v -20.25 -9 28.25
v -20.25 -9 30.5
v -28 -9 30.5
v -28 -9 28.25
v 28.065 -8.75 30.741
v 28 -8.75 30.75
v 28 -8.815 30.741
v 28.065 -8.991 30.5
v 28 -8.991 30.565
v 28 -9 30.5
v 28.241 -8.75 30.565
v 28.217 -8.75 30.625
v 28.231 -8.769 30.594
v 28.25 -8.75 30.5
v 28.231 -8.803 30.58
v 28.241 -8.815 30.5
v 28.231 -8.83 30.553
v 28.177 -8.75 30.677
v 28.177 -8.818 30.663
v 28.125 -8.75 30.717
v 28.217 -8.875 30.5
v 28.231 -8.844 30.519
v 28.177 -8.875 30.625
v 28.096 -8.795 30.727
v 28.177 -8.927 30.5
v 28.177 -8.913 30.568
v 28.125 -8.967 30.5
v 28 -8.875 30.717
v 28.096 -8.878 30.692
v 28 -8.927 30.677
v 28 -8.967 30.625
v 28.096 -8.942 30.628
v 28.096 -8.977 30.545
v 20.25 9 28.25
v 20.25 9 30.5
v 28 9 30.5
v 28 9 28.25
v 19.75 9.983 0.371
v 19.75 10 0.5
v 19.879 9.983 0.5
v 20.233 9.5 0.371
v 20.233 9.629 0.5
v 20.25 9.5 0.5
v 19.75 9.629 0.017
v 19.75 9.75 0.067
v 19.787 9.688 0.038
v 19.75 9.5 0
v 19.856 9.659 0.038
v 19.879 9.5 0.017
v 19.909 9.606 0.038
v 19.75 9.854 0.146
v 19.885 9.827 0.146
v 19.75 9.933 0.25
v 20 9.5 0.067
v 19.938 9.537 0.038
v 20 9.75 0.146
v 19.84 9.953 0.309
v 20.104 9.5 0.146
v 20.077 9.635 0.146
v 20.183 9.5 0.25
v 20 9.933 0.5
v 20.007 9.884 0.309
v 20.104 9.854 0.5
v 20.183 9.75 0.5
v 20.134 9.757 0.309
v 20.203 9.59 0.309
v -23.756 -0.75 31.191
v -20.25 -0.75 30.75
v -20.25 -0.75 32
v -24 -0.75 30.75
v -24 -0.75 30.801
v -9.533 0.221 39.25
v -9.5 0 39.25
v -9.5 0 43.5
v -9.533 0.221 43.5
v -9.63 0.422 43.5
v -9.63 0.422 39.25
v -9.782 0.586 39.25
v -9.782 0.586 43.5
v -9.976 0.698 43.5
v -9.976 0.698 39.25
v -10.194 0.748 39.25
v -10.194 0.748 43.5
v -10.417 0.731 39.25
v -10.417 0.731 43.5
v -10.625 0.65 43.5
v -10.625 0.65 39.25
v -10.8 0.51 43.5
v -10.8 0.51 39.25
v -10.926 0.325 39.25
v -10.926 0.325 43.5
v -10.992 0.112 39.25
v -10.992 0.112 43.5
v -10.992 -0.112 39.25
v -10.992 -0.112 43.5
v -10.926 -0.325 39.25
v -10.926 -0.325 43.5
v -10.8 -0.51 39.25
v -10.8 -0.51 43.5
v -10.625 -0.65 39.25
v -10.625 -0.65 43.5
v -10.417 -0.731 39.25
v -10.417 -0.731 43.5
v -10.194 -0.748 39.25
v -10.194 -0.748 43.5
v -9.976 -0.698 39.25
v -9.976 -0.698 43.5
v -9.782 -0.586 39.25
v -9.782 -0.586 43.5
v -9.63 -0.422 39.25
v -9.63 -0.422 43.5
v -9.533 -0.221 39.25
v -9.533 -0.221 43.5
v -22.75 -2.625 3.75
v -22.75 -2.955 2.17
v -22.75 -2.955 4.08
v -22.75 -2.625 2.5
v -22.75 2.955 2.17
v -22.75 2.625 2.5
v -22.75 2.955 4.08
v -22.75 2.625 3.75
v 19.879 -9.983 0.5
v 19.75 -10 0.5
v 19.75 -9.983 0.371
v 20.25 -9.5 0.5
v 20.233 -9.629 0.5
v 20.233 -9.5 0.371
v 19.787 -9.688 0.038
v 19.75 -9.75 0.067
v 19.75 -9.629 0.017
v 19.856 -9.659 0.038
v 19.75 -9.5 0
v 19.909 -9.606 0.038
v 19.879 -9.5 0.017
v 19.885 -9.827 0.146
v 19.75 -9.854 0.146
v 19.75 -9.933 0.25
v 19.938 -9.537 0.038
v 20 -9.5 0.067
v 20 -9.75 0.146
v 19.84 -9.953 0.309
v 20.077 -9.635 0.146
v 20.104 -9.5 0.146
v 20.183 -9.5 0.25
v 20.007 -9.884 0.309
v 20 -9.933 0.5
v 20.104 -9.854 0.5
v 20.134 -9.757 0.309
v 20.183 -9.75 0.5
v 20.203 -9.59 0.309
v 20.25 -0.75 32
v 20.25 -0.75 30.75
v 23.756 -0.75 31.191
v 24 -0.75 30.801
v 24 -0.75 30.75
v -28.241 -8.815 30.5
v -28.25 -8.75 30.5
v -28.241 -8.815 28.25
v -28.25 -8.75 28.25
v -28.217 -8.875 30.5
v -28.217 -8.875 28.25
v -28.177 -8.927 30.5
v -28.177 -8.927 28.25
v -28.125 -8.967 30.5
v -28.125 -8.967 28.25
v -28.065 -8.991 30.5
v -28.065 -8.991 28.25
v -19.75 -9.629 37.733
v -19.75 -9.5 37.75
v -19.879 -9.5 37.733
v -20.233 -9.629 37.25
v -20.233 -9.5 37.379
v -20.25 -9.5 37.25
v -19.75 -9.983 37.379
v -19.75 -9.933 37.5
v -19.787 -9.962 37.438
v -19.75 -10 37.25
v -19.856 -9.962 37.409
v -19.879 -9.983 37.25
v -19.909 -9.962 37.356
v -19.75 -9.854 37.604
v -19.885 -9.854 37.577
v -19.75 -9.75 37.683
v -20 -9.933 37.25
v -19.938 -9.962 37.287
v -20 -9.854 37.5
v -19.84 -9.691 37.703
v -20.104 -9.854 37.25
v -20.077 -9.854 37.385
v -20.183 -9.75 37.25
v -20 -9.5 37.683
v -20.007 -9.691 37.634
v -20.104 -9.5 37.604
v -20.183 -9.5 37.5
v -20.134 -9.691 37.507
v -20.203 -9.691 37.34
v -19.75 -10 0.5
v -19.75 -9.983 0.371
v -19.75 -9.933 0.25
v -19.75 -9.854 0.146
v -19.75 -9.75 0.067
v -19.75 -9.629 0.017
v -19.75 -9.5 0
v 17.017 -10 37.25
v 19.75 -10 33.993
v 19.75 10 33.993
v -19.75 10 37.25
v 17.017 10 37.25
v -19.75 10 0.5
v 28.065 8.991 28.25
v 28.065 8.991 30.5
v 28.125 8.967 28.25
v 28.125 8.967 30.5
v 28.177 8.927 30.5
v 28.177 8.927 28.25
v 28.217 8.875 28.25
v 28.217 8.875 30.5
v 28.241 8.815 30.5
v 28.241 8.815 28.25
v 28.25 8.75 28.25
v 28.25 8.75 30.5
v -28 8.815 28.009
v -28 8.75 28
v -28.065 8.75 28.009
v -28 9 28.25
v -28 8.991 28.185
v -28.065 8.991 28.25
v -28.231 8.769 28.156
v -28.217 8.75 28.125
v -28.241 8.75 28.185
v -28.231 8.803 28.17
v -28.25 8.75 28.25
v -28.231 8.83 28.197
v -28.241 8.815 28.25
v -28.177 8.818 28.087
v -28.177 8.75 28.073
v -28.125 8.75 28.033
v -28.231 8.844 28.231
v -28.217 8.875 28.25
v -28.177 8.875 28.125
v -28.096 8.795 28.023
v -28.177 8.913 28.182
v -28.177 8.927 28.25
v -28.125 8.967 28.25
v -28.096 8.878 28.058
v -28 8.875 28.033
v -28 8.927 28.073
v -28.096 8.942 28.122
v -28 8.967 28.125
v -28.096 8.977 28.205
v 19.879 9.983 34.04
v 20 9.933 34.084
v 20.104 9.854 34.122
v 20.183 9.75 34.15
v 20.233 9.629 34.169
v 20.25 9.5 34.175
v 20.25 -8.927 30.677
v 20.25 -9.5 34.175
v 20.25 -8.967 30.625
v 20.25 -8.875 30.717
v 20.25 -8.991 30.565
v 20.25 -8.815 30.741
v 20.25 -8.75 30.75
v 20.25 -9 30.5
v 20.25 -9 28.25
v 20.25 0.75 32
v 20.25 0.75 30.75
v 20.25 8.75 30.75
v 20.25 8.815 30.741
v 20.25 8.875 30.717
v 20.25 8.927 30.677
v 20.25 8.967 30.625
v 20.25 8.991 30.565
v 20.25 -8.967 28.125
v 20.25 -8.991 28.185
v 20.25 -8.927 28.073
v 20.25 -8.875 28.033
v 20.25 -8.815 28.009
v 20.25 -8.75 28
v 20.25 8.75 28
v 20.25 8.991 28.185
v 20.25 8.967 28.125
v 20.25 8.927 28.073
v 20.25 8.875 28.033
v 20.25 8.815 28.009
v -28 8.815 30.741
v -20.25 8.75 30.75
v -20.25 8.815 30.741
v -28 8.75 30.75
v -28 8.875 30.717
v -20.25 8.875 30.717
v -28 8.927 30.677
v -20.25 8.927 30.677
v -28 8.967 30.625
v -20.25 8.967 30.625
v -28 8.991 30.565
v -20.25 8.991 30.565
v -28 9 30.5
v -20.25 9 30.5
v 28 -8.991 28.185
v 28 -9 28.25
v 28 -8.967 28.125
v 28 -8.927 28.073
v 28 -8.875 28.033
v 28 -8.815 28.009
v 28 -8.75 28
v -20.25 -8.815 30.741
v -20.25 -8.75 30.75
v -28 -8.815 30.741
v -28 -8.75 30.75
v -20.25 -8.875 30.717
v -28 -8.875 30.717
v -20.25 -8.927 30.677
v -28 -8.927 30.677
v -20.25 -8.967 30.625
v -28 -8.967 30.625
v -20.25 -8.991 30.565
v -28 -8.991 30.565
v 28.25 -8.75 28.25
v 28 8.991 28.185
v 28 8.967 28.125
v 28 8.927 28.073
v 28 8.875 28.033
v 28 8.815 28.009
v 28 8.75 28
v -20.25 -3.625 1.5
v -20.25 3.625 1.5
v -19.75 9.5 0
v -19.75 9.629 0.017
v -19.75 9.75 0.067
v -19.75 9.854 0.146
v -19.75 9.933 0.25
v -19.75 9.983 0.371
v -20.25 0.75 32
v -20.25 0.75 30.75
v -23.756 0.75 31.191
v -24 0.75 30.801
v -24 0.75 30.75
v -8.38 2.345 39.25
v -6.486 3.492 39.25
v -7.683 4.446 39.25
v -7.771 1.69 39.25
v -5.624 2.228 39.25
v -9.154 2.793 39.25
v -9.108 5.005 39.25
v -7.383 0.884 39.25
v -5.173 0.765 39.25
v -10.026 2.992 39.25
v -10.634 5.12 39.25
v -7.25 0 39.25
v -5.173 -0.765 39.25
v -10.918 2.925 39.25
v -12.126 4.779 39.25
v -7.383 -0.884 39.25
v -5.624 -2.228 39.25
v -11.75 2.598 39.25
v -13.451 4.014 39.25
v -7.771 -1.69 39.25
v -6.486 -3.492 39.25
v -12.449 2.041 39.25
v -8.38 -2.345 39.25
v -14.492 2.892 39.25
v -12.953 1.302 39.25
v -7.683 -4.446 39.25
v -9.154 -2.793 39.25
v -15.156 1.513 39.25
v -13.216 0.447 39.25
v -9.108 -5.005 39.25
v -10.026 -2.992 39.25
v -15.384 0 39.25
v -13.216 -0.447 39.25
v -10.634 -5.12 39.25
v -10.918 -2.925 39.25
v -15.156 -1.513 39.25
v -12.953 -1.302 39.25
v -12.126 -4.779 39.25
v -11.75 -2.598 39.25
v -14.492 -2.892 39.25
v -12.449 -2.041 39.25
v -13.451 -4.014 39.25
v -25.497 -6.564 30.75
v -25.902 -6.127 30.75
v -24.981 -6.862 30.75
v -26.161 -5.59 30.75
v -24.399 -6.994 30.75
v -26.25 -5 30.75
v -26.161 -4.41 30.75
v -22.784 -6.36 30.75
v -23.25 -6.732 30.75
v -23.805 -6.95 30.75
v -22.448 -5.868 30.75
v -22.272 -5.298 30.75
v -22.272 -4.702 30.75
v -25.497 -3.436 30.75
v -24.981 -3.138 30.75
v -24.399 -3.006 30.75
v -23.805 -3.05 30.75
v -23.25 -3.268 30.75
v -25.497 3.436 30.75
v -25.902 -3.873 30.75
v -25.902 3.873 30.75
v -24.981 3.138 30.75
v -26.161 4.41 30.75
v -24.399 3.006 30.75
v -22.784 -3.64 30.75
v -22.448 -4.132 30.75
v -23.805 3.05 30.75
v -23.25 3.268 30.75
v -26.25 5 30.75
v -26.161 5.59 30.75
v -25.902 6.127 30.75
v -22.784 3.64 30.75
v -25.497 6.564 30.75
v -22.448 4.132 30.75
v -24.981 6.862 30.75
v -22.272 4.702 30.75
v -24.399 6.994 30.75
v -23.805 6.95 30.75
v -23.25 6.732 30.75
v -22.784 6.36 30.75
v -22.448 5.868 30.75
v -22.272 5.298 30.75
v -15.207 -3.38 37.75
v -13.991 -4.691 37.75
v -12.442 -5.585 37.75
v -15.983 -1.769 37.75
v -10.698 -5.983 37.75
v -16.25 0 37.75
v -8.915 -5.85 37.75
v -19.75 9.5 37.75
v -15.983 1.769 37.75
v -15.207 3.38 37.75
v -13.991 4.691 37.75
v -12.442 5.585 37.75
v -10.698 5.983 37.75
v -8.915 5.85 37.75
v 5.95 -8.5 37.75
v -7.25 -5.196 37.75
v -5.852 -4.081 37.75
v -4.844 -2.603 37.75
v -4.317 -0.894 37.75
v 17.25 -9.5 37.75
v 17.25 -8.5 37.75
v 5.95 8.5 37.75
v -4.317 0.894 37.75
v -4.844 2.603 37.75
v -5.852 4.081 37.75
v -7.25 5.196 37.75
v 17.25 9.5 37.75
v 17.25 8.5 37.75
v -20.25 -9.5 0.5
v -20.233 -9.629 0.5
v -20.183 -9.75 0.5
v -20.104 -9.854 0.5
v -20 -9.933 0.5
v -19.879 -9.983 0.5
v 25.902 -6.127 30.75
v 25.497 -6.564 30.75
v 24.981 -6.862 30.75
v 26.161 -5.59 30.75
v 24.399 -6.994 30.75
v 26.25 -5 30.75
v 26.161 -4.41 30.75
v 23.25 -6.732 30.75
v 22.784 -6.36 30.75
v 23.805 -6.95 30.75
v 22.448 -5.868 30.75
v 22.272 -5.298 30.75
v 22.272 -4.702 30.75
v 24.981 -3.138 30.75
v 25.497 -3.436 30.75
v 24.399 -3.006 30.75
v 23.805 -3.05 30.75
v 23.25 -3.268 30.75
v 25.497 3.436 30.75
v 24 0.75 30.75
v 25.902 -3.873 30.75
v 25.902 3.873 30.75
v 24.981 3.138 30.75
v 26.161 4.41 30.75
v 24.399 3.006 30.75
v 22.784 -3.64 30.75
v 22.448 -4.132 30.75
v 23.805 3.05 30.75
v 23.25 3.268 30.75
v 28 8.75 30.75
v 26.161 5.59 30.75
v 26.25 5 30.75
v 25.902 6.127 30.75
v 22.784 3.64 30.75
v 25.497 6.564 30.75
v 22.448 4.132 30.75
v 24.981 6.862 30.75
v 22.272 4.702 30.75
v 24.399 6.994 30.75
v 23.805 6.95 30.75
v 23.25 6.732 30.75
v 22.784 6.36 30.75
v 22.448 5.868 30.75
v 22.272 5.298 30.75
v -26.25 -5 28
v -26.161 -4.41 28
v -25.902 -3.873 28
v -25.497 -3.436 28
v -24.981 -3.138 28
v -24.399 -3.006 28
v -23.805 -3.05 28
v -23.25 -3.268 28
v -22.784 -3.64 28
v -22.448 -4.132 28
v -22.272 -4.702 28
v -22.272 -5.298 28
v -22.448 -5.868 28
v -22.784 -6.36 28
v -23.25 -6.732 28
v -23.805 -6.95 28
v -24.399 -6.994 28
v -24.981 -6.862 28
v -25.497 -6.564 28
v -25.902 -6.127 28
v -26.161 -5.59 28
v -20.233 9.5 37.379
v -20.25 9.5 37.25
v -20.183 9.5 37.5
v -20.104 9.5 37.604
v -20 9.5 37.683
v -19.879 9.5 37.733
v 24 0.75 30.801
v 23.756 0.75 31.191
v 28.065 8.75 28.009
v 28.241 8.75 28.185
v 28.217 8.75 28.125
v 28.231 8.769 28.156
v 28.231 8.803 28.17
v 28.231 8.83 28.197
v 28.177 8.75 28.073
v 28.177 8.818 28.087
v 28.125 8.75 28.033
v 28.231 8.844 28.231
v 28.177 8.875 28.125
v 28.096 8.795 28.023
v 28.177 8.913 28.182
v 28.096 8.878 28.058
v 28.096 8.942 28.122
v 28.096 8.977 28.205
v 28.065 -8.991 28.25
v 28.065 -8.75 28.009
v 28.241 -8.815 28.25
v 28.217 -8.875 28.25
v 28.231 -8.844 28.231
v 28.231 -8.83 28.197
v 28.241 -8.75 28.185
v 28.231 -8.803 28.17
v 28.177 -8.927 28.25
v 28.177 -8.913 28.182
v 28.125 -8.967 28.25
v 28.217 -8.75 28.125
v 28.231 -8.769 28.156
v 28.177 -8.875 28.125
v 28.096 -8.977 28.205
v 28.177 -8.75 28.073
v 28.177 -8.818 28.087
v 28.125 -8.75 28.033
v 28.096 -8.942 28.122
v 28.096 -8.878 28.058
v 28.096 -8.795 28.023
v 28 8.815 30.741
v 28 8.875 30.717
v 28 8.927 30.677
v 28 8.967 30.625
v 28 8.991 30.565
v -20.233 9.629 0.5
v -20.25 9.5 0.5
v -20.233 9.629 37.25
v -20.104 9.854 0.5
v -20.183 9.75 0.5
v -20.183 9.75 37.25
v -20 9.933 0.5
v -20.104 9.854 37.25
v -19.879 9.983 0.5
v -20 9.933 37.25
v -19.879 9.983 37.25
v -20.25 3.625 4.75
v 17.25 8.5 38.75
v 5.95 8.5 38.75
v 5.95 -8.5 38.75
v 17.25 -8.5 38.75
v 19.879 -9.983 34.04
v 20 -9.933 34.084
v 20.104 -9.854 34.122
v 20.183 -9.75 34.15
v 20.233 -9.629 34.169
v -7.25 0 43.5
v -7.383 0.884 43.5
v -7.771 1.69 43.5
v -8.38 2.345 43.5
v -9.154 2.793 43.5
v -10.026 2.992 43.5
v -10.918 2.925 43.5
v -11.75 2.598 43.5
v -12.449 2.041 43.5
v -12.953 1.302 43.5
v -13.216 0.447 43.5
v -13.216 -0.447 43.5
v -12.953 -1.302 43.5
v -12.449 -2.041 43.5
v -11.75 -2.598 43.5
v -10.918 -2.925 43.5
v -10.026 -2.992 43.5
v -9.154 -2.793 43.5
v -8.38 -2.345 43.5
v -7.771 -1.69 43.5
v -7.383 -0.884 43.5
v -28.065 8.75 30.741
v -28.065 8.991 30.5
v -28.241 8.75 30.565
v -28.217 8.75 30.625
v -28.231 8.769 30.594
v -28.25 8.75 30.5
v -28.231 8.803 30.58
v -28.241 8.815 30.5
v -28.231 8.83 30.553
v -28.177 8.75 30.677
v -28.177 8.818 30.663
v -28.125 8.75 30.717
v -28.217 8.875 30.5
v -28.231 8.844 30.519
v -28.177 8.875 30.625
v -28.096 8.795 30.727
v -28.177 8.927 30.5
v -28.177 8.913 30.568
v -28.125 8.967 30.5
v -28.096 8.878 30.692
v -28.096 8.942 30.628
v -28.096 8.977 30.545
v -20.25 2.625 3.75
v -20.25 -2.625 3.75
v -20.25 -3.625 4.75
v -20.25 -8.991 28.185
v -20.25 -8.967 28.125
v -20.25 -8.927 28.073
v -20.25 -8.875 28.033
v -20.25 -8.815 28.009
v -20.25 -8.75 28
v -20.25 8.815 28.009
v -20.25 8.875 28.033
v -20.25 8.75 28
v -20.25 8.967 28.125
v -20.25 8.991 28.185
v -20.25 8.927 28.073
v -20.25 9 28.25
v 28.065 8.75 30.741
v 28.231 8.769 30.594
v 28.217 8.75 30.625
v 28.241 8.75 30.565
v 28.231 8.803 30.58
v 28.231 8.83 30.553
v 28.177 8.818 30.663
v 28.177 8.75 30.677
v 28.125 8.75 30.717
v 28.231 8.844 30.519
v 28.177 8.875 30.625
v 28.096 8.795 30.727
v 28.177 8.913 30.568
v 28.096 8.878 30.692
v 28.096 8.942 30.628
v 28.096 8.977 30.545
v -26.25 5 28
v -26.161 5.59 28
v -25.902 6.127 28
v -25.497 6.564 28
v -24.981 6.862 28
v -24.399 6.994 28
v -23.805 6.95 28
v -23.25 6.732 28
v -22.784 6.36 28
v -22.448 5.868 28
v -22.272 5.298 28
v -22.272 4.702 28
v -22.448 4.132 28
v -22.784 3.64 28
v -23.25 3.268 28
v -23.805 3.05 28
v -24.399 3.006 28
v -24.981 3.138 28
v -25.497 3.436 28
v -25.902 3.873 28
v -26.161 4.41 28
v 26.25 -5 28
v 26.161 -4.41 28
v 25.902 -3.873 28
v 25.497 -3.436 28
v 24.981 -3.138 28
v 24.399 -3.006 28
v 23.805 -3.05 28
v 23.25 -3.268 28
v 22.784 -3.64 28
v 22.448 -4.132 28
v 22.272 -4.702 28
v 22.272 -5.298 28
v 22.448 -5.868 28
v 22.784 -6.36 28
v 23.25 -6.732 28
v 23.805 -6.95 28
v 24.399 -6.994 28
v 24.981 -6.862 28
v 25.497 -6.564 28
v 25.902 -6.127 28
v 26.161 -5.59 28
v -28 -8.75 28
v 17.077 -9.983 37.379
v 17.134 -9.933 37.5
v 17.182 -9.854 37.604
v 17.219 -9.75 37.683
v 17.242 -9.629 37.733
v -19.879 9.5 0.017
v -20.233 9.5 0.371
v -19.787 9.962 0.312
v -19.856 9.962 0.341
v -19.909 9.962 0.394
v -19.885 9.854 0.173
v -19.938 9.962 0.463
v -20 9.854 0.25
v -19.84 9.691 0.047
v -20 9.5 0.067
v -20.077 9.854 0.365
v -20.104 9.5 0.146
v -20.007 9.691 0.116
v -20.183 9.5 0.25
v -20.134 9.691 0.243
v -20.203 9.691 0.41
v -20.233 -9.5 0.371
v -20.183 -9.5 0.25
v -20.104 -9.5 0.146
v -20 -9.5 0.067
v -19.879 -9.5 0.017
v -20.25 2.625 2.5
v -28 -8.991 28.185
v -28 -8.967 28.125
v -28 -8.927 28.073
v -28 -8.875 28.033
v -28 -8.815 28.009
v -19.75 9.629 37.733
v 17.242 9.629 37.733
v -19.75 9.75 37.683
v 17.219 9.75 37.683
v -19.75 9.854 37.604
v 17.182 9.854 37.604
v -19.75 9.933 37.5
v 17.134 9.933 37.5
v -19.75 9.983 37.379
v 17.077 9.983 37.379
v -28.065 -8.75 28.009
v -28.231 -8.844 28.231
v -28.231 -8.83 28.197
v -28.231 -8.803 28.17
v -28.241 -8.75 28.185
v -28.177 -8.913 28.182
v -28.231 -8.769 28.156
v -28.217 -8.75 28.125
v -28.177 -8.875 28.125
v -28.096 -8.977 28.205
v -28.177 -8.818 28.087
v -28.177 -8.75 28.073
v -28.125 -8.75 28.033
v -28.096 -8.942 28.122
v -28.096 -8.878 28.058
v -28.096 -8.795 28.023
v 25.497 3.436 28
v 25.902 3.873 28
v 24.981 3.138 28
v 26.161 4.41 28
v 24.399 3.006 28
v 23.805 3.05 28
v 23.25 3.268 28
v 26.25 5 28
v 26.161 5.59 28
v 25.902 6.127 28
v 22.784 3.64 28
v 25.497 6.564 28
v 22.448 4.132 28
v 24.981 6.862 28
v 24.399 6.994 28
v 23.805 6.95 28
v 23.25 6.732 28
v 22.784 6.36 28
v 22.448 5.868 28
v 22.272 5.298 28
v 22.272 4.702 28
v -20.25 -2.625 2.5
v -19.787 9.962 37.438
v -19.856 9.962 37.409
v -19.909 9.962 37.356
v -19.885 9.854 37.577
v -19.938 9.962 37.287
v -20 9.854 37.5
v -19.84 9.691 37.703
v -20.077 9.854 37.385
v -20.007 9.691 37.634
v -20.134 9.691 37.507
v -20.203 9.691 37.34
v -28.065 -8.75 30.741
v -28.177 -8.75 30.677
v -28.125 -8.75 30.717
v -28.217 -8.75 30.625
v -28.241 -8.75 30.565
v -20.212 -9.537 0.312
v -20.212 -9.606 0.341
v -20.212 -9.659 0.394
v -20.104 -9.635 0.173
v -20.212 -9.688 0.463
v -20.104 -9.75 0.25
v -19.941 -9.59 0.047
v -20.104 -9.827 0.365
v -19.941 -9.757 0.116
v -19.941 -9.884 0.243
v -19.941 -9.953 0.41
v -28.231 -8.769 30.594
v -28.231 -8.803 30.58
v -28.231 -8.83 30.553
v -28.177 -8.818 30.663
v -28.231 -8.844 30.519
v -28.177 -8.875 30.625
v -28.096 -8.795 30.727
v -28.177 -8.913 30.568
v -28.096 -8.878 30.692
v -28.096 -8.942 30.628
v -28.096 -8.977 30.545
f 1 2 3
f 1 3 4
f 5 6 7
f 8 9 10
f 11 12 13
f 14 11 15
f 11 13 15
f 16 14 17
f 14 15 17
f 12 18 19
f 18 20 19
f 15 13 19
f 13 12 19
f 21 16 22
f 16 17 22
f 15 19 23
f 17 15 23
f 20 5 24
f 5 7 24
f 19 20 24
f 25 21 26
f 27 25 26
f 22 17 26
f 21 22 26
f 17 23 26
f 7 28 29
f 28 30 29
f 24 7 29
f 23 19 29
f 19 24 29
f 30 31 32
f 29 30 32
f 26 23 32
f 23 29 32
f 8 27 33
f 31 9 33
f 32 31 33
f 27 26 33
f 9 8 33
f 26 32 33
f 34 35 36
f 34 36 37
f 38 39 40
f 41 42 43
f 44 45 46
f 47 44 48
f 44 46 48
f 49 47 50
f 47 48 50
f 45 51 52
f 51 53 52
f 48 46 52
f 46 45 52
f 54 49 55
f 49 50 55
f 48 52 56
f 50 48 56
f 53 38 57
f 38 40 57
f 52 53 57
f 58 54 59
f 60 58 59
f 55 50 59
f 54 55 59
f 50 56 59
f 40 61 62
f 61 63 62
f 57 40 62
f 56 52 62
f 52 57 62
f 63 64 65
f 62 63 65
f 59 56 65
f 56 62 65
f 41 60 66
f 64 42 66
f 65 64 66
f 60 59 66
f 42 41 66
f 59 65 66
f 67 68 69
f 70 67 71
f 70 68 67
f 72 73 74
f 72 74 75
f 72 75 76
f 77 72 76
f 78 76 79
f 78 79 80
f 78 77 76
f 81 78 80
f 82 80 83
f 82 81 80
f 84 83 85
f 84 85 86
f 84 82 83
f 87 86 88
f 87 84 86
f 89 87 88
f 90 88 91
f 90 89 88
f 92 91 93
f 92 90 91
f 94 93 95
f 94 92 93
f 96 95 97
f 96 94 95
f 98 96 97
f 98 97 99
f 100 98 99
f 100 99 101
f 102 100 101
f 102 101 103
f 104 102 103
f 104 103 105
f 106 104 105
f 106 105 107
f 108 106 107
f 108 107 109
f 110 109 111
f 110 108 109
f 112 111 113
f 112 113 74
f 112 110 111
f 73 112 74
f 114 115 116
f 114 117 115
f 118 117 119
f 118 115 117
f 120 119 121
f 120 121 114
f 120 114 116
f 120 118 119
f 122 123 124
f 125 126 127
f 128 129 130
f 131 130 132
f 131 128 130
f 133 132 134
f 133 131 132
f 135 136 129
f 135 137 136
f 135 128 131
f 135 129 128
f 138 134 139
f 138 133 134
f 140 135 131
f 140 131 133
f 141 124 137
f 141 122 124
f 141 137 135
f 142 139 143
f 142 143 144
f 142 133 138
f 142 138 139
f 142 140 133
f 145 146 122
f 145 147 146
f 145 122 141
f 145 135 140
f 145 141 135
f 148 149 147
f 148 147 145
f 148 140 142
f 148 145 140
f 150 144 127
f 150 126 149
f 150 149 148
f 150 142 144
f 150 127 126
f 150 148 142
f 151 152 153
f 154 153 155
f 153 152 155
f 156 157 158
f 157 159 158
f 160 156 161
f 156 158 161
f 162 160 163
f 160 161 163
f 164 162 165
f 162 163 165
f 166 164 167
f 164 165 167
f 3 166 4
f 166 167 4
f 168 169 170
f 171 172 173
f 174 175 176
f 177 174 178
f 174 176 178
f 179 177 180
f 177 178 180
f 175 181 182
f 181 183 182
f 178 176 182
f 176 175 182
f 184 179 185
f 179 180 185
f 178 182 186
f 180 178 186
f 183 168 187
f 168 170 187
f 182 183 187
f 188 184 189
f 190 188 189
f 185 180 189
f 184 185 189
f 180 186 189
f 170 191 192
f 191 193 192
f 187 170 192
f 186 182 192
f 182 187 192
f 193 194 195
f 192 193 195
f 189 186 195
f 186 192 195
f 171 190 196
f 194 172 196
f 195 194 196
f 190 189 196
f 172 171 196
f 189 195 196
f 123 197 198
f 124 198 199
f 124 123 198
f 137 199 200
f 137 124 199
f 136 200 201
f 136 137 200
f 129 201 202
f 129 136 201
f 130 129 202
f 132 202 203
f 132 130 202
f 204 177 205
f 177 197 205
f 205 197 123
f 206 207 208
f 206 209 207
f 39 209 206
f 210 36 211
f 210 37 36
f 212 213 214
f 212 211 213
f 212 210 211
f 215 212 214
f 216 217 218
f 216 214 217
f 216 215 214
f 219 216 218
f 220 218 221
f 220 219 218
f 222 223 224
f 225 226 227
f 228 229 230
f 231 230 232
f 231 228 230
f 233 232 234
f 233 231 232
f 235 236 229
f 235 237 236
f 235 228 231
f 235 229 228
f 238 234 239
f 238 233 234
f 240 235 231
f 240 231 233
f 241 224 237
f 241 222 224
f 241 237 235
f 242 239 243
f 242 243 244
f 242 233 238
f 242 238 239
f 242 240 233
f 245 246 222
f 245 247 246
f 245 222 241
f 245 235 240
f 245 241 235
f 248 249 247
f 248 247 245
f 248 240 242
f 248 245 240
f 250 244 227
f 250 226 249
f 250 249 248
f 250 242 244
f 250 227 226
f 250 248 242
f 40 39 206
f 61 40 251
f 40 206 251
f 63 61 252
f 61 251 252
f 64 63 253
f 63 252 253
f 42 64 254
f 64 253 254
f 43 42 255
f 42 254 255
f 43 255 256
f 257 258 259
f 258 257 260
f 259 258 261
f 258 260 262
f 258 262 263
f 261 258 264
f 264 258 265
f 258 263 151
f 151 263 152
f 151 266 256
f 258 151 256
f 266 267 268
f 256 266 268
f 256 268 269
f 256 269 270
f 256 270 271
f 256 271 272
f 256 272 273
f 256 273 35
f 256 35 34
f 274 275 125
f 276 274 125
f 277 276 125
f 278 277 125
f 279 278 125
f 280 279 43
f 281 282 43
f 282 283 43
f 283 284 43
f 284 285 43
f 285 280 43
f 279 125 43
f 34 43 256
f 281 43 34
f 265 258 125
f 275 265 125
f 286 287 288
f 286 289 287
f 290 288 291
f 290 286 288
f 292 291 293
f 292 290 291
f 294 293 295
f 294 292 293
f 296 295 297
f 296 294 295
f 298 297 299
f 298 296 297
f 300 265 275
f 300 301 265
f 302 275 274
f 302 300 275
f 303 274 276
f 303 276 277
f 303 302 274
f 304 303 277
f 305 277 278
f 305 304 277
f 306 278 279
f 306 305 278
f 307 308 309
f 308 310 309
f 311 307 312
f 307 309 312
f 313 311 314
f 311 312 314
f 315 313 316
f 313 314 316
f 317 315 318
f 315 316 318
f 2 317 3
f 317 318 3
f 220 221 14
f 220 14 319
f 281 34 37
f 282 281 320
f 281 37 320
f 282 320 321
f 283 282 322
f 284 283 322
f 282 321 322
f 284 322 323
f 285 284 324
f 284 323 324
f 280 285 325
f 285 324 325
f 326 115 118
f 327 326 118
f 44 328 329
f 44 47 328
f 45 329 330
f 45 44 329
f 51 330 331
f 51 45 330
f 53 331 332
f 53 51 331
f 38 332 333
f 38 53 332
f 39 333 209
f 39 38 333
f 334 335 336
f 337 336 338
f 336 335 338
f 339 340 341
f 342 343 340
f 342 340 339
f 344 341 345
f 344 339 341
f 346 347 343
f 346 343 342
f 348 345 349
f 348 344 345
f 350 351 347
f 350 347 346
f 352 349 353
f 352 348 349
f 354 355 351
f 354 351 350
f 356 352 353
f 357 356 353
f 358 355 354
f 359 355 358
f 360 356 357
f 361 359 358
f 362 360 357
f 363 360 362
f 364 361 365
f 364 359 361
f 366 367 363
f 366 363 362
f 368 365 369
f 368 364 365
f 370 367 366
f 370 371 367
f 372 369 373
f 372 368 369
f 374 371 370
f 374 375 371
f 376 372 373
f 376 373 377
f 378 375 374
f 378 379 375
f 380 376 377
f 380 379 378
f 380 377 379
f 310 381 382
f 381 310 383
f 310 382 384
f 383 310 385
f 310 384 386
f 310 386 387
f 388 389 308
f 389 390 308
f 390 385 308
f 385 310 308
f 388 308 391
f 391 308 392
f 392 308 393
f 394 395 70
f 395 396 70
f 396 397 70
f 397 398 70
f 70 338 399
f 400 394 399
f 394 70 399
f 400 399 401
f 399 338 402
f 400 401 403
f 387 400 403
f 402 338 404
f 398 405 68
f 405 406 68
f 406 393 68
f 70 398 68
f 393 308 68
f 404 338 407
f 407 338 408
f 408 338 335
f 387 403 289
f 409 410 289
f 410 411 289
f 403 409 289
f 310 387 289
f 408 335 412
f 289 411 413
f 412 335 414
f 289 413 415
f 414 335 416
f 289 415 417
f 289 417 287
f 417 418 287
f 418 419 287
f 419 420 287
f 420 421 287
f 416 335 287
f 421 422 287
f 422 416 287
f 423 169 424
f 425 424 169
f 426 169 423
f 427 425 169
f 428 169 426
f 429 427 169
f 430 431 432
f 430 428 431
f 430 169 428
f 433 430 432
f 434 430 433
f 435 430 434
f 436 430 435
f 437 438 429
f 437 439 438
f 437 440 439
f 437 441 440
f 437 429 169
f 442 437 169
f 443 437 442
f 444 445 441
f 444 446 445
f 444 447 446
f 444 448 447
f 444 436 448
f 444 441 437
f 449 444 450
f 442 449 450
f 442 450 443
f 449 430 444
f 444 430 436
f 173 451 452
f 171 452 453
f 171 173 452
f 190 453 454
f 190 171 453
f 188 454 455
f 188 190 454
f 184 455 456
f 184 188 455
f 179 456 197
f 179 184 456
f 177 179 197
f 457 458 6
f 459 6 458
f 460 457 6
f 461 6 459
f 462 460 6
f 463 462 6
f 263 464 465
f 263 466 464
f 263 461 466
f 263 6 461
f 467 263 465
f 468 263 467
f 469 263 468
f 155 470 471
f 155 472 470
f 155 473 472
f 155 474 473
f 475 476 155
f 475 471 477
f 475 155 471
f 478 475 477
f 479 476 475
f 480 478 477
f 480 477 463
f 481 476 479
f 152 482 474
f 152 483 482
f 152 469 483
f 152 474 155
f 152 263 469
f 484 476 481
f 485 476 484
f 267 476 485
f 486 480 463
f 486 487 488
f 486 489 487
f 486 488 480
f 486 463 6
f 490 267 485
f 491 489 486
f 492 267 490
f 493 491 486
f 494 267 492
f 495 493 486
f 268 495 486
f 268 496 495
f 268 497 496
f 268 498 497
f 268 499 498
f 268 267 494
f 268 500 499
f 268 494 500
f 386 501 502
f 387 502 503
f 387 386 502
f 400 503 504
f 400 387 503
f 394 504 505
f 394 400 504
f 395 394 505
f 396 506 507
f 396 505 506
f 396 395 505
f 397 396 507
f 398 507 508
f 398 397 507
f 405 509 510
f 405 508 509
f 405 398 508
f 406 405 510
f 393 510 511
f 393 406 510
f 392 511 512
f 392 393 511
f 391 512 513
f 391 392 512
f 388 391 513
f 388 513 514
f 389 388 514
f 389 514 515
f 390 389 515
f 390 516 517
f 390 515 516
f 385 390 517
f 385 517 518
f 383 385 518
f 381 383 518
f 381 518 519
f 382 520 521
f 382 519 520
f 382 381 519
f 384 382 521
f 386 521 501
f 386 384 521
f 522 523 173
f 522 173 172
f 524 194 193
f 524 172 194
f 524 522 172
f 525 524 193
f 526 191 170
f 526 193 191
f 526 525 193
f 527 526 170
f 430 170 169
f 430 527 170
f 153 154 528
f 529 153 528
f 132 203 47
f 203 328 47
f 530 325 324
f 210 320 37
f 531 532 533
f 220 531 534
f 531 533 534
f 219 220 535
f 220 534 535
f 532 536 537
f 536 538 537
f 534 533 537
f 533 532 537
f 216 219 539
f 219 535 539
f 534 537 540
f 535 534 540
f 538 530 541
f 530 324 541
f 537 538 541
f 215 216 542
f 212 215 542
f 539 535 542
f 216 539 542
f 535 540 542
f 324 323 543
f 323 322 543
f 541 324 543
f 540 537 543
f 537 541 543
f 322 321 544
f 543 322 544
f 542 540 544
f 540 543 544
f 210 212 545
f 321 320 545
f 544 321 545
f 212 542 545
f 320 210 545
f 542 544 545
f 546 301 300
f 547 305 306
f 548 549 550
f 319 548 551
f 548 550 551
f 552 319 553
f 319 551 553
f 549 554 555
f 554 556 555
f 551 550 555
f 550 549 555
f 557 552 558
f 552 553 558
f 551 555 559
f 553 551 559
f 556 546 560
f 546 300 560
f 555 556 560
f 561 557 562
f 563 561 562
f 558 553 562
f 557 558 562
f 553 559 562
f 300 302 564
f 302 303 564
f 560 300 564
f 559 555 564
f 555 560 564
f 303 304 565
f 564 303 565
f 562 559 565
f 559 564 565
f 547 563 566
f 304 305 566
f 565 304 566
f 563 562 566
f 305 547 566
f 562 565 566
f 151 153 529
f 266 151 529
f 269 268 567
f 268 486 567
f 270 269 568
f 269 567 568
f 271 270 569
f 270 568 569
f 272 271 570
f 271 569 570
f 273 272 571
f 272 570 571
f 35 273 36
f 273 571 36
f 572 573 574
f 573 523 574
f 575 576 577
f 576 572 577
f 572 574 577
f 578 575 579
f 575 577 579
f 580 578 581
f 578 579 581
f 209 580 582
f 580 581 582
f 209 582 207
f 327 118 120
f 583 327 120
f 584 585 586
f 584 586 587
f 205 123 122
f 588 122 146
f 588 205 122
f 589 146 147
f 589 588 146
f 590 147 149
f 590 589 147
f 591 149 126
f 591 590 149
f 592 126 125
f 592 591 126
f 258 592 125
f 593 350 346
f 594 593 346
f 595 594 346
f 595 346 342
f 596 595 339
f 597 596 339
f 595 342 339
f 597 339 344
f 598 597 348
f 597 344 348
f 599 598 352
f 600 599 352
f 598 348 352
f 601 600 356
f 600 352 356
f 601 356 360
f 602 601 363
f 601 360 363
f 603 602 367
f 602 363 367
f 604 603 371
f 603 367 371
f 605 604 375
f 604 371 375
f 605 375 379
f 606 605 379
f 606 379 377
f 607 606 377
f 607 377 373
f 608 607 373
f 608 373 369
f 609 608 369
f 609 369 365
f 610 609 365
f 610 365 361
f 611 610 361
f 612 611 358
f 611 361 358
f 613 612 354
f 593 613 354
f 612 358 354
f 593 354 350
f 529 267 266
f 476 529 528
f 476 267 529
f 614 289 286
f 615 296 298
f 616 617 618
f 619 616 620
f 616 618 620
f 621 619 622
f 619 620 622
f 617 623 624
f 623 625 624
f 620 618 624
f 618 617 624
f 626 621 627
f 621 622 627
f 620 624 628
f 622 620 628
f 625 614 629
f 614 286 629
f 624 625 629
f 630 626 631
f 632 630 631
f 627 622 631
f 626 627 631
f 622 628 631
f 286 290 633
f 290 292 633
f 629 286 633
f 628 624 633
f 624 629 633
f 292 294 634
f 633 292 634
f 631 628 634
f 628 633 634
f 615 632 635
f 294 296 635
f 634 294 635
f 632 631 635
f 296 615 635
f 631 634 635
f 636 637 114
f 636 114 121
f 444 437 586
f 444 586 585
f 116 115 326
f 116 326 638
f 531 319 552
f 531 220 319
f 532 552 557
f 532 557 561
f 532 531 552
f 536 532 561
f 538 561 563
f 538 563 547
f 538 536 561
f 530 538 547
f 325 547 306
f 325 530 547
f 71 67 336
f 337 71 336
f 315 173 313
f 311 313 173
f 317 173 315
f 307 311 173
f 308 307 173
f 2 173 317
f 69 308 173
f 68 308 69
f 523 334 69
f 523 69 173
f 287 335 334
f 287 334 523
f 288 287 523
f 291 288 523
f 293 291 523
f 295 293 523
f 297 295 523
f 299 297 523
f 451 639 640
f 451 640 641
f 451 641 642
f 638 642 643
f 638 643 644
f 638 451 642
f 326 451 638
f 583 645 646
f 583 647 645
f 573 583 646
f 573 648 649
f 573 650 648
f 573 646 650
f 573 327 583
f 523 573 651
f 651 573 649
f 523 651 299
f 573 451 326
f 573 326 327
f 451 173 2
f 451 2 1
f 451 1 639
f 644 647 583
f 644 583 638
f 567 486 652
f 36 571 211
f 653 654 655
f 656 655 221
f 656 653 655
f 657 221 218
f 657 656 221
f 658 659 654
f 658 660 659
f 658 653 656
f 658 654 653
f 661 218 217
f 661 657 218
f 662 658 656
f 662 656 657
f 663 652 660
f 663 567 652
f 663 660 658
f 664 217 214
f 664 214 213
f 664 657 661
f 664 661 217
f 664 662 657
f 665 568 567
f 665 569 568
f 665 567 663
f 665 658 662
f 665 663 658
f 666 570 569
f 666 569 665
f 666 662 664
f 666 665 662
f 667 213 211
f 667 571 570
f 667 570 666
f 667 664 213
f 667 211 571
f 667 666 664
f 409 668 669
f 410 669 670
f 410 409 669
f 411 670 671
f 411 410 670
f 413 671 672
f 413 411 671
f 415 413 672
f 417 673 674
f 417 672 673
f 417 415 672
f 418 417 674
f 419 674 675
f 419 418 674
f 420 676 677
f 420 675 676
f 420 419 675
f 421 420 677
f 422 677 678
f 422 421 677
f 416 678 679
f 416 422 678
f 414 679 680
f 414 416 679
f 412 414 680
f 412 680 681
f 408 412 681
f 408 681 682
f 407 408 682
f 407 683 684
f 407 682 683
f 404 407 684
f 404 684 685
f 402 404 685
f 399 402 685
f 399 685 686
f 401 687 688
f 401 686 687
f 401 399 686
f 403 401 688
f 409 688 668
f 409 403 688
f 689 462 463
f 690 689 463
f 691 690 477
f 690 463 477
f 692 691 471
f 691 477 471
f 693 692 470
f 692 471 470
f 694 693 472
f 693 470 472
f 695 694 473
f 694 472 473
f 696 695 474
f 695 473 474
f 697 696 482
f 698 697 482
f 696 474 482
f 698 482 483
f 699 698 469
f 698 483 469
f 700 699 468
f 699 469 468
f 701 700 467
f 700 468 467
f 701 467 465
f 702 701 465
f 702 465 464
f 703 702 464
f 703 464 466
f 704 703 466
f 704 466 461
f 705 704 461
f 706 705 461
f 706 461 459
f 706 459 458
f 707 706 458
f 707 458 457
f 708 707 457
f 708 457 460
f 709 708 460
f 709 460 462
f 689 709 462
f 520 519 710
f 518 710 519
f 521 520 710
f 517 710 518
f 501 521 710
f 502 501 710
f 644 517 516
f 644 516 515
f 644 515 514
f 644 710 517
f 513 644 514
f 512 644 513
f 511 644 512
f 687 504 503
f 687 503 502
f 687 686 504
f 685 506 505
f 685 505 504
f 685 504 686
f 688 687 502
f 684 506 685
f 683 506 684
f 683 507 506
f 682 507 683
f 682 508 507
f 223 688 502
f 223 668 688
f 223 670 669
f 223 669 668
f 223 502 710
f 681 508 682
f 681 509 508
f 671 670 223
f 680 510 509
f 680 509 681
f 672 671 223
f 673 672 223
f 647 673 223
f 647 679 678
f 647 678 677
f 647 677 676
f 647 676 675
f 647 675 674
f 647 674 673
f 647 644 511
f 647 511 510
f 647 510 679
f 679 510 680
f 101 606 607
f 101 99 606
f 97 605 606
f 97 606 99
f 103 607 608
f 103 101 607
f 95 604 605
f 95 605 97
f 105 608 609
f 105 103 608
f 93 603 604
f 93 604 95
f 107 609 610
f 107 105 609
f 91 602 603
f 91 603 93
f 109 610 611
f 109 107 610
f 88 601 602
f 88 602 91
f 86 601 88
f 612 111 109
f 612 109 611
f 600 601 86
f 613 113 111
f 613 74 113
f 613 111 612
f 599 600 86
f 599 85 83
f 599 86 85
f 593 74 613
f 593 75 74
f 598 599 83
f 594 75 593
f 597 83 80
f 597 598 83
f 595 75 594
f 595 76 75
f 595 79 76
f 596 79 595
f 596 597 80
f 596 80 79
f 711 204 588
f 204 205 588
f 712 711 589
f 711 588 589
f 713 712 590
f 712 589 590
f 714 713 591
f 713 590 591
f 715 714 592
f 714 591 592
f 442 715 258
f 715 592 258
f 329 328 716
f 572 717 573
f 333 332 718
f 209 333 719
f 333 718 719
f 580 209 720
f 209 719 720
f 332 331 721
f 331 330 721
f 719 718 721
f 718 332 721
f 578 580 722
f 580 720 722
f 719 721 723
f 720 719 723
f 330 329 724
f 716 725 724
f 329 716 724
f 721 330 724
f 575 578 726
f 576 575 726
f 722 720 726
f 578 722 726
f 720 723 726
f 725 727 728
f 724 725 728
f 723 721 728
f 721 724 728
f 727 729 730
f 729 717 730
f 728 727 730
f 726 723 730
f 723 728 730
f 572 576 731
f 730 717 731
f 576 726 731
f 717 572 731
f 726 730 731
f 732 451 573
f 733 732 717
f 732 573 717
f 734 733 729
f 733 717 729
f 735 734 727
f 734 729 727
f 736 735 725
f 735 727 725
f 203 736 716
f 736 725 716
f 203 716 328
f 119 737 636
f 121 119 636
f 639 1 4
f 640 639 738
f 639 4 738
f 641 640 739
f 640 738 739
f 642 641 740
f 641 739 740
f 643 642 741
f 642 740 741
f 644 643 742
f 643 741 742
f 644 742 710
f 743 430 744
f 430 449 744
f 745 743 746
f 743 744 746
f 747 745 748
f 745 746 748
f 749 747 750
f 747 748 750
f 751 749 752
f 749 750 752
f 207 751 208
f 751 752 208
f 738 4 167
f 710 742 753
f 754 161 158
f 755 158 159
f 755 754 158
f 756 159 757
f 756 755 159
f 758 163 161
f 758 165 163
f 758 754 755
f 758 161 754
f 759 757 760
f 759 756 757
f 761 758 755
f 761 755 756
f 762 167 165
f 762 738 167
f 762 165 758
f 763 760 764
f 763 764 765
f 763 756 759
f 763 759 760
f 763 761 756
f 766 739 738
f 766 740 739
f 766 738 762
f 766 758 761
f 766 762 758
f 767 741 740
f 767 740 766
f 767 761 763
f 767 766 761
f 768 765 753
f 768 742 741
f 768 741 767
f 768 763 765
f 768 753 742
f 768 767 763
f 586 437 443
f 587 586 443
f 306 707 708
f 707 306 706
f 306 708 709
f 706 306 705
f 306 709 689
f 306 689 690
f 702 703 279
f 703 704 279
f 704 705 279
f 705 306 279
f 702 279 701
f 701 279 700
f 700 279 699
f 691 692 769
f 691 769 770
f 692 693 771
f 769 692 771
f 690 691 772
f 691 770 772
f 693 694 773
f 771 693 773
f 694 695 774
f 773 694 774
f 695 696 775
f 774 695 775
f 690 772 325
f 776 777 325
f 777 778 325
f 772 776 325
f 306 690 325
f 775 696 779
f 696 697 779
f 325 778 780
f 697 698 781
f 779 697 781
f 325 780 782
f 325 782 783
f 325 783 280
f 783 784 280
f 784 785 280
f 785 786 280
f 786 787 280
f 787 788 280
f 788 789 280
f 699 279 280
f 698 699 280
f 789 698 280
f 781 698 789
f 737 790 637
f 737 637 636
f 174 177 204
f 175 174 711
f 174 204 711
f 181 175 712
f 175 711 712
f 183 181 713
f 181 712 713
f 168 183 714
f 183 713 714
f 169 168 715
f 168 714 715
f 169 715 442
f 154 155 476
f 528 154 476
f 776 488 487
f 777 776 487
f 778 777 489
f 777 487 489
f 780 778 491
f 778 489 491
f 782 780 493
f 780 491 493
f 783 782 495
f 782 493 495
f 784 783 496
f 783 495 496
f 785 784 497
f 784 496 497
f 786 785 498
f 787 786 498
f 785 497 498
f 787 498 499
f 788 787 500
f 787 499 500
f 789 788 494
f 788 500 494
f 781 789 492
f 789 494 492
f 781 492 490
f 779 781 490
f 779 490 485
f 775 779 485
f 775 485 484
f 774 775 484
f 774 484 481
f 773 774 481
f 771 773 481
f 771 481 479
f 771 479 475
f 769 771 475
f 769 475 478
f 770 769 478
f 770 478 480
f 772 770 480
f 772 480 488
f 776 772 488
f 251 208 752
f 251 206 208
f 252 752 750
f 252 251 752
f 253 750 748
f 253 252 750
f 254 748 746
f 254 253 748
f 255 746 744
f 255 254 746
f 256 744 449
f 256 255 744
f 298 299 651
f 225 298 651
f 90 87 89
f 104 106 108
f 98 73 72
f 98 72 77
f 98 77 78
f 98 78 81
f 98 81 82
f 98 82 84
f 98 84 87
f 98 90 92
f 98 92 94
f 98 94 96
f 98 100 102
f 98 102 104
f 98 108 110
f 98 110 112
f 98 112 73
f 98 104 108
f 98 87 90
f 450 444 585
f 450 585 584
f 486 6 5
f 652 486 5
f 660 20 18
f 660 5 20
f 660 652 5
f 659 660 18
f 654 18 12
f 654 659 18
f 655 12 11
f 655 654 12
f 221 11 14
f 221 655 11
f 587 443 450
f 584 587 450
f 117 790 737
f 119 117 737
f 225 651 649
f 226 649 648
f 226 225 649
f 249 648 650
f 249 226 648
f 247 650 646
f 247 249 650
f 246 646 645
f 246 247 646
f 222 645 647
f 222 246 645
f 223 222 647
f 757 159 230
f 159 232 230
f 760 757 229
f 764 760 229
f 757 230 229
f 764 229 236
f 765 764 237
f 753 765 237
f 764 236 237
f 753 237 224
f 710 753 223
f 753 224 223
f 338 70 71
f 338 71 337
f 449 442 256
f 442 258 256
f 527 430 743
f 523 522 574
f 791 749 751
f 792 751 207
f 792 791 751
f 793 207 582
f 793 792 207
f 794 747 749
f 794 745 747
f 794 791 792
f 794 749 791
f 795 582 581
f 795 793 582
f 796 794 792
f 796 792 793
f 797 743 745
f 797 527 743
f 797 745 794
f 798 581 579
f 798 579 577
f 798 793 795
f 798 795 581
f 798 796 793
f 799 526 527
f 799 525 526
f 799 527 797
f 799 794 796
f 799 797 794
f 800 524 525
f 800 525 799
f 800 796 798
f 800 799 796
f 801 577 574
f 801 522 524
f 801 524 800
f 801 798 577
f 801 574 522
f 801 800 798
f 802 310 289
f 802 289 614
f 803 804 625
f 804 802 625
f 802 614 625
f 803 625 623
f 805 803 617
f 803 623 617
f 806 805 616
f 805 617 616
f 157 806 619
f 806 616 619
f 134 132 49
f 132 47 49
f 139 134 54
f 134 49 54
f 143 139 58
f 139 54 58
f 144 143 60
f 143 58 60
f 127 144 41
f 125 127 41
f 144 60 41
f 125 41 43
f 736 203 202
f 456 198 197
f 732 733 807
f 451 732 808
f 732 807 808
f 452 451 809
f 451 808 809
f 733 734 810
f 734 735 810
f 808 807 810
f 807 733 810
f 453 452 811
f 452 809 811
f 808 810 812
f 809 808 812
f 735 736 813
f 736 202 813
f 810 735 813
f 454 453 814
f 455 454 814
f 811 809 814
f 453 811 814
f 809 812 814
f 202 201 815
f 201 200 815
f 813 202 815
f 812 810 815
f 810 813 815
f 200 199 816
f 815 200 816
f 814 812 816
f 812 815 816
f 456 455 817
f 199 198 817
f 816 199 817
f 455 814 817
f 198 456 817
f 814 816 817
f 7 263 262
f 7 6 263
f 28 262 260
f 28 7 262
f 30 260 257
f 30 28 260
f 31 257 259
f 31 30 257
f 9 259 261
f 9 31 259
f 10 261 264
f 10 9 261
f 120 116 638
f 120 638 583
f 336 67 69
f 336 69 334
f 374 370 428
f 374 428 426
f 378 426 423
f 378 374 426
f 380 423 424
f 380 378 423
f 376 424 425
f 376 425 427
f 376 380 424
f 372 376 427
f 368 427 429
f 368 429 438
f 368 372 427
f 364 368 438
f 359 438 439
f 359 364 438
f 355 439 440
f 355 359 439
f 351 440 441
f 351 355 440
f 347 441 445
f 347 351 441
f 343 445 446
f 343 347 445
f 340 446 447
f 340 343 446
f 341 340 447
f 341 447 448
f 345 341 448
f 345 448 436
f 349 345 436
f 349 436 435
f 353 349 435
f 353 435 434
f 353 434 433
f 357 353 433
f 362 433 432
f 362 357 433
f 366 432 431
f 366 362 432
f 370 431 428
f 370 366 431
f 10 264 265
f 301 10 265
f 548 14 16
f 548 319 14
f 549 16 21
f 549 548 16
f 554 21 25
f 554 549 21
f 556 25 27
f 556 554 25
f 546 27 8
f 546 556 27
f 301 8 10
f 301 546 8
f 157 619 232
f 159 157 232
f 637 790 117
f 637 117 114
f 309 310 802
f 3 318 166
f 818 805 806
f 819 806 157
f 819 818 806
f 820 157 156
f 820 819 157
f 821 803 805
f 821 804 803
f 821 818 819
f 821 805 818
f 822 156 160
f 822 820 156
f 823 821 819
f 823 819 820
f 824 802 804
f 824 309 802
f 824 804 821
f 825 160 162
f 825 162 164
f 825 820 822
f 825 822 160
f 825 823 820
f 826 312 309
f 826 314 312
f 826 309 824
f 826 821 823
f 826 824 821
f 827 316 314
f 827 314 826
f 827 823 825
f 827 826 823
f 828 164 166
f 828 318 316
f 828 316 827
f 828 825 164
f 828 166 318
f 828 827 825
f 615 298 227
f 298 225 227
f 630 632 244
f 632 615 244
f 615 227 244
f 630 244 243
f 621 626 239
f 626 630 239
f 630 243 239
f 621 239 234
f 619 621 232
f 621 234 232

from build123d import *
from OCP.BRepFilletAPI import BRepFilletAPI_MakeChamfer

# Parameters (mm, degrees)
SKETCH1_W                 = 40.5
SKETCH1_H                 = 20
BOSS_EXTRUDE1_DEPTH       = 37.75
SKETCH2_W                 = 2.75
SKETCH2_H                 = 18
BOSS_EXTRUDE2_DEPTH       = 8
SKETCH3_R                 = 2
CUT_EXTRUDE1_DEPTH        = 4
SKETCH4_W                 = 3.75
SKETCH4_H                 = 1.5
BOSS_EXTRUDE3_DEPTH       = 1.25
CHAMFER1_SIZE2            = 0.865755717
CHAMFER1_SIZE             = 3.75
CHAMFER2_SIZE             = 0.25
CHAMFER2_SIZE2            = 0.333581356
FILLET1_R                 = 0.25
CHAMFER1_OF_MIRROR1_SIZE2 = 0.865755717
CHAMFER1_OF_MIRROR1_SIZE  = 3.75
CHAMFER2_OF_MIRROR1_SIZE2 = 0.25
CHAMFER2_OF_MIRROR1_SIZE  = 0.333581356
FILLET1_OF_MIRROR1_R      = 0.25
SKETCH5_W                 = 11.3
SKETCH5_H                 = 17
BOSS_EXTRUDE4_DEPTH       = 1
SKETCH6_R                 = 6
BOSS_EXTRUDE5_DEPTH       = 1.5
CHAMFER3_SIZE2            = 0.866025404
CHAMFER3_SIZE             = 1.5
SKETCH7_R                 = 3
SKETCH7_R_2               = 0.75
BOSS_EXTRUDE6_DEPTH       = 4.25
SKETCH8_W                 = 3.25
SKETCH8_H                 = 7.25
SKETCH8_W_2               = 1.25
SKETCH8_H_2               = 5.25
BOSS_EXTRUDE7_DEPTH       = 2.5
CHAMFER5_SIZE2            = 3.575260778
CHAMFER5_SIZE             = 3
CHAMFER4_SIZE             = 2.5
CHAMFER4_SIZE_2           = 0.669872981
FILLET2_R                 = 0.5


with BuildPart() as part:
    # Sketch1 → Boss-Extrude1 (new body)
    with BuildSketch(Plane.XY):
        Rectangle(SKETCH1_W, SKETCH1_H)
    extrude(amount=BOSS_EXTRUDE1_DEPTH)

    # Sketch2 → Boss-Extrude2 (add)
    with BuildSketch(Plane(origin=(20.25, 0, 0), x_dir=(0, 0, -1), z_dir=(1, 0, 0))):
        with Locations((-29.375, 0)):
            Rectangle(SKETCH2_W, SKETCH2_H)
    boss_extrude2 = extrude(amount=BOSS_EXTRUDE2_DEPTH)

    # Sketch3 → Cut-Extrude1 (cut)
    with BuildSketch(Plane.XY.offset(30.75)):
        with Locations((24.25, 5)):
            Circle(SKETCH3_R)
        with Locations((24.25, -5)):
            Circle(SKETCH3_R)
    cut_extrude1 = extrude(amount=-CUT_EXTRUDE1_DEPTH, mode=Mode.SUBTRACT)

    # Sketch4 → Boss-Extrude3 (add)
    with BuildSketch(Plane.XY.offset(30.75)):
        with Locations((22.125, 0)):
            Rectangle(SKETCH4_W, SKETCH4_H)
    boss_extrude3 = extrude(amount=BOSS_EXTRUDE3_DEPTH)

    # Chamfer1
    chamfer1_edges = [part.edges().sort_by_distance(p)[0] for p in [
        (24, 0, 32),
    ]]
    chamfer1_side = [part.faces().sort_by_distance(p)[0] for p in [
        (23.982684886, 0, 32),
    ]]
    chamfer(chamfer1_edges, length=CHAMFER1_SIZE - 0.0001, length2=CHAMFER1_SIZE2 - 0.0001, reference=chamfer1_side[0])  # a hair under: the kernel refuses the full size

    # Chamfer2
    chamfer2_edges = [part.edges().sort_by_distance(p)[0] for p in [
        (24, 0, 31.134344283),
    ]]
    chamfer2_side = [part.faces().sort_by_distance(p)[0] for p in [
        (22.12505, 0, 31.567172141),
    ]]
    chamfer(chamfer2_edges, length=CHAMFER2_SIZE, length2=CHAMFER2_SIZE2, reference=chamfer2_side[0])

    # Fillet1
    fillet1_edges = [part.edges().sort_by_distance(p)[0] for p in [
        (24.25, 9, 30.75),
        (24.25, -9, 30.75),
        (24.25, -9, 28),
        (24.25, 9, 28),
        (28.25, 0, 30.75),
        (28.25, -9, 29.375),
        (28.25, 0, 28),
        (28.25, 9, 29.375),
    ]]
    fillet(fillet1_edges, radius=FILLET1_R)

    # Mirror1: Boss-Extrude2, Cut-Extrude1, Boss-Extrude3 across plane
    add(boss_extrude2.mirror(Plane(origin=(0, 0, 0), x_dir=(0, 0, 1), z_dir=(1, 0, 0))))
    add(cut_extrude1.mirror(Plane(origin=(0, 0, 0), x_dir=(0, 0, 1), z_dir=(1, 0, 0))), mode=Mode.SUBTRACT)
    add(boss_extrude3.mirror(Plane(origin=(0, 0, 0), x_dir=(0, 0, 1), z_dir=(1, 0, 0))))

    # Chamfer1 of Mirror1
    chamfer1_of_mirror1_edges = [part.edges().sort_by_distance(p)[0] for p in [
        (-24, 0, 32),
    ]]
    chamfer1_of_mirror1_side = [part.faces().sort_by_distance(p)[0] for p in [
        (-23.982684886, 0, 32),
    ]]
    chamfer(chamfer1_of_mirror1_edges, length=CHAMFER1_OF_MIRROR1_SIZE - 0.0001, length2=CHAMFER1_OF_MIRROR1_SIZE2 - 0.0001, reference=chamfer1_of_mirror1_side[0])  # a hair under: the kernel refuses the full size

    # Chamfer2 of Mirror1
    chamfer2_of_mirror1_edges = [part.edges().sort_by_distance(p)[0] for p in [
        (-24, 0, 31.134344283),
    ]]
    chamfer(chamfer2_of_mirror1_edges, length=CHAMFER2_OF_MIRROR1_SIZE, length2=CHAMFER2_OF_MIRROR1_SIZE2)

    # Fillet1 of Mirror1
    fillet1_of_mirror1_edges = [part.edges().sort_by_distance(p)[0] for p in [
        (-24.25, 9, 30.75),
        (-24.25, -9, 30.75),
        (-24.25, -9, 28),
        (-24.25, 9, 28),
        (-28.25, 0, 30.75),
        (-28.25, -9, 29.375),
        (-28.25, 0, 28),
        (-28.25, 9, 29.375),
    ]]
    fillet(fillet1_of_mirror1_edges, radius=FILLET1_OF_MIRROR1_R)

    # Sketch5 → Boss-Extrude4 (add)
    with BuildSketch(Plane.XY.offset(37.75)):
        with Locations((11.6, 0)):
            Rectangle(SKETCH5_W, SKETCH5_H)
    extrude(amount=BOSS_EXTRUDE4_DEPTH)

    # Sketch6 → Boss-Extrude5 (add)
    with BuildSketch(Plane.XY.offset(37.75)):
        with Locations(Location((-10.25, 0, 0), (0, 0, 180))):
            Circle(SKETCH6_R)
    extrude(amount=BOSS_EXTRUDE5_DEPTH)

    # Chamfer3
    chamfer3_edges = [part.edges().sort_by_distance(p)[0] for p in [
        (-4.25, 0, 39.25),
    ]]
    chamfer3_side = [part.faces().sort_by_distance(p)[0] for p in [
        (-4.25, 0, 39.232679492),
    ]]
    chamfer(chamfer3_edges, length=CHAMFER3_SIZE - 0.0001, length2=CHAMFER3_SIZE2 - 0.0001, reference=chamfer3_side[0])  # a hair under: the kernel refuses the full size

    # Sketch7 → Boss-Extrude6 (add)
    with BuildSketch(Plane.XY.offset(39.25)):
        with Locations((-10.25, 0)):
            Circle(SKETCH7_R)
        with Locations((-10.25, 0)):
            Circle(SKETCH7_R_2, mode=Mode.SUBTRACT)
    extrude(amount=BOSS_EXTRUDE6_DEPTH)

    # Sketch8 → Boss-Extrude7 (add)
    with BuildSketch(Plane.ZY.offset(20.25)):
        with Locations((3.125, 0)):
            Rectangle(SKETCH8_W, SKETCH8_H)
        with Locations((3.125, 0)):
            Rectangle(SKETCH8_W_2, SKETCH8_H_2, mode=Mode.SUBTRACT)
    extrude(amount=BOSS_EXTRUDE7_DEPTH)

    # Chamfer5
    chamfer5_edges = [part.edges().sort_by_distance(p)[0] for p in [
        (20.25, 0, 37.75),
    ]]
    chamfer5_side = [part.faces().sort_by_distance(p)[0] for p in [
        (20.19, 0, 37.75),
    ]]
    chamfer(chamfer5_edges, length=CHAMFER5_SIZE - 0.0001, length2=CHAMFER5_SIZE2 - 0.0001, reference=chamfer5_side[0])  # a hair under: the kernel refuses the full size

    # Chamfer4
    chamfer4_edges_1 = [part.edges().sort_by_distance(p)[0] for p in [
        (-22.75, -3.625, 3.125),
    ]]
    chamfer4_side_1 = [part.faces().sort_by_distance(p)[0] for p in [
        (-22.73660254, -3.625, 3.125),
    ]]
    chamfer4_edges_2 = [part.edges().sort_by_distance(p)[0] for p in [
        (-22.75, 0, 4.75),
    ]]
    chamfer4_side_2 = [part.faces().sort_by_distance(p)[0] for p in [
        (-22.73660254, 0, 4.75),
    ]]
    chamfer4_edges_3 = [part.edges().sort_by_distance(p)[0] for p in [
        (-22.75, 3.625, 3.125),
    ]]
    chamfer4_side_3 = [part.faces().sort_by_distance(p)[0] for p in [
        (-22.73660254, 3.625, 3.125),
    ]]
    chamfer4_edges_4 = [part.edges().sort_by_distance(p)[0] for p in [
        (-22.75, 0, 1.5),
    ]]
    chamfer4_side_4 = [part.faces().sort_by_distance(p)[0] for p in [
        (-22.73660254, 0, 1.5),
    ]]
    chamfer4 = BRepFilletAPI_MakeChamfer(part.part.solid().wrapped)
    for e in chamfer4_edges_1:
        chamfer4.Add(CHAMFER4_SIZE - 0.0001, CHAMFER4_SIZE_2 - 0.0001, e.wrapped, chamfer4_side_1[0].wrapped)
    for e in chamfer4_edges_2:
        chamfer4.Add(CHAMFER4_SIZE - 0.0001, CHAMFER4_SIZE_2 - 0.0001, e.wrapped, chamfer4_side_2[0].wrapped)
    for e in chamfer4_edges_3:
        chamfer4.Add(CHAMFER4_SIZE - 0.0001, CHAMFER4_SIZE_2 - 0.0001, e.wrapped, chamfer4_side_3[0].wrapped)
    for e in chamfer4_edges_4:
        chamfer4.Add(CHAMFER4_SIZE - 0.0001, CHAMFER4_SIZE_2 - 0.0001, e.wrapped, chamfer4_side_4[0].wrapped)
    add(Compound.cast(chamfer4.Shape()), mode=Mode.REPLACE)  # a hair under: the kernel refuses the full size

    # Fillet2
    fillet2_edges = [part.edges().sort_by_distance(p)[0] for p in [
        (-20.25, 0, 37.75),
        (-1.49995, -10, 37.75),
        (-1.49995, 10, 37.75),
        (20.25, 10, 17.087419611),
        (18.75005, 10, 35.962419611),
        (20.25, -10, 17.087419611),
        (18.75005, -10, 35.962419611),
        (0, -10, 0),
        (-20.25, 0, 0),
        (0, 10, 0),
        (20.25, 0, 0),
        (-20.25, -10, 18.875),
        (-20.25, 10, 18.875),
    ]]
    fillet(fillet2_edges, radius=FILLET2_R)


solid = part.part
